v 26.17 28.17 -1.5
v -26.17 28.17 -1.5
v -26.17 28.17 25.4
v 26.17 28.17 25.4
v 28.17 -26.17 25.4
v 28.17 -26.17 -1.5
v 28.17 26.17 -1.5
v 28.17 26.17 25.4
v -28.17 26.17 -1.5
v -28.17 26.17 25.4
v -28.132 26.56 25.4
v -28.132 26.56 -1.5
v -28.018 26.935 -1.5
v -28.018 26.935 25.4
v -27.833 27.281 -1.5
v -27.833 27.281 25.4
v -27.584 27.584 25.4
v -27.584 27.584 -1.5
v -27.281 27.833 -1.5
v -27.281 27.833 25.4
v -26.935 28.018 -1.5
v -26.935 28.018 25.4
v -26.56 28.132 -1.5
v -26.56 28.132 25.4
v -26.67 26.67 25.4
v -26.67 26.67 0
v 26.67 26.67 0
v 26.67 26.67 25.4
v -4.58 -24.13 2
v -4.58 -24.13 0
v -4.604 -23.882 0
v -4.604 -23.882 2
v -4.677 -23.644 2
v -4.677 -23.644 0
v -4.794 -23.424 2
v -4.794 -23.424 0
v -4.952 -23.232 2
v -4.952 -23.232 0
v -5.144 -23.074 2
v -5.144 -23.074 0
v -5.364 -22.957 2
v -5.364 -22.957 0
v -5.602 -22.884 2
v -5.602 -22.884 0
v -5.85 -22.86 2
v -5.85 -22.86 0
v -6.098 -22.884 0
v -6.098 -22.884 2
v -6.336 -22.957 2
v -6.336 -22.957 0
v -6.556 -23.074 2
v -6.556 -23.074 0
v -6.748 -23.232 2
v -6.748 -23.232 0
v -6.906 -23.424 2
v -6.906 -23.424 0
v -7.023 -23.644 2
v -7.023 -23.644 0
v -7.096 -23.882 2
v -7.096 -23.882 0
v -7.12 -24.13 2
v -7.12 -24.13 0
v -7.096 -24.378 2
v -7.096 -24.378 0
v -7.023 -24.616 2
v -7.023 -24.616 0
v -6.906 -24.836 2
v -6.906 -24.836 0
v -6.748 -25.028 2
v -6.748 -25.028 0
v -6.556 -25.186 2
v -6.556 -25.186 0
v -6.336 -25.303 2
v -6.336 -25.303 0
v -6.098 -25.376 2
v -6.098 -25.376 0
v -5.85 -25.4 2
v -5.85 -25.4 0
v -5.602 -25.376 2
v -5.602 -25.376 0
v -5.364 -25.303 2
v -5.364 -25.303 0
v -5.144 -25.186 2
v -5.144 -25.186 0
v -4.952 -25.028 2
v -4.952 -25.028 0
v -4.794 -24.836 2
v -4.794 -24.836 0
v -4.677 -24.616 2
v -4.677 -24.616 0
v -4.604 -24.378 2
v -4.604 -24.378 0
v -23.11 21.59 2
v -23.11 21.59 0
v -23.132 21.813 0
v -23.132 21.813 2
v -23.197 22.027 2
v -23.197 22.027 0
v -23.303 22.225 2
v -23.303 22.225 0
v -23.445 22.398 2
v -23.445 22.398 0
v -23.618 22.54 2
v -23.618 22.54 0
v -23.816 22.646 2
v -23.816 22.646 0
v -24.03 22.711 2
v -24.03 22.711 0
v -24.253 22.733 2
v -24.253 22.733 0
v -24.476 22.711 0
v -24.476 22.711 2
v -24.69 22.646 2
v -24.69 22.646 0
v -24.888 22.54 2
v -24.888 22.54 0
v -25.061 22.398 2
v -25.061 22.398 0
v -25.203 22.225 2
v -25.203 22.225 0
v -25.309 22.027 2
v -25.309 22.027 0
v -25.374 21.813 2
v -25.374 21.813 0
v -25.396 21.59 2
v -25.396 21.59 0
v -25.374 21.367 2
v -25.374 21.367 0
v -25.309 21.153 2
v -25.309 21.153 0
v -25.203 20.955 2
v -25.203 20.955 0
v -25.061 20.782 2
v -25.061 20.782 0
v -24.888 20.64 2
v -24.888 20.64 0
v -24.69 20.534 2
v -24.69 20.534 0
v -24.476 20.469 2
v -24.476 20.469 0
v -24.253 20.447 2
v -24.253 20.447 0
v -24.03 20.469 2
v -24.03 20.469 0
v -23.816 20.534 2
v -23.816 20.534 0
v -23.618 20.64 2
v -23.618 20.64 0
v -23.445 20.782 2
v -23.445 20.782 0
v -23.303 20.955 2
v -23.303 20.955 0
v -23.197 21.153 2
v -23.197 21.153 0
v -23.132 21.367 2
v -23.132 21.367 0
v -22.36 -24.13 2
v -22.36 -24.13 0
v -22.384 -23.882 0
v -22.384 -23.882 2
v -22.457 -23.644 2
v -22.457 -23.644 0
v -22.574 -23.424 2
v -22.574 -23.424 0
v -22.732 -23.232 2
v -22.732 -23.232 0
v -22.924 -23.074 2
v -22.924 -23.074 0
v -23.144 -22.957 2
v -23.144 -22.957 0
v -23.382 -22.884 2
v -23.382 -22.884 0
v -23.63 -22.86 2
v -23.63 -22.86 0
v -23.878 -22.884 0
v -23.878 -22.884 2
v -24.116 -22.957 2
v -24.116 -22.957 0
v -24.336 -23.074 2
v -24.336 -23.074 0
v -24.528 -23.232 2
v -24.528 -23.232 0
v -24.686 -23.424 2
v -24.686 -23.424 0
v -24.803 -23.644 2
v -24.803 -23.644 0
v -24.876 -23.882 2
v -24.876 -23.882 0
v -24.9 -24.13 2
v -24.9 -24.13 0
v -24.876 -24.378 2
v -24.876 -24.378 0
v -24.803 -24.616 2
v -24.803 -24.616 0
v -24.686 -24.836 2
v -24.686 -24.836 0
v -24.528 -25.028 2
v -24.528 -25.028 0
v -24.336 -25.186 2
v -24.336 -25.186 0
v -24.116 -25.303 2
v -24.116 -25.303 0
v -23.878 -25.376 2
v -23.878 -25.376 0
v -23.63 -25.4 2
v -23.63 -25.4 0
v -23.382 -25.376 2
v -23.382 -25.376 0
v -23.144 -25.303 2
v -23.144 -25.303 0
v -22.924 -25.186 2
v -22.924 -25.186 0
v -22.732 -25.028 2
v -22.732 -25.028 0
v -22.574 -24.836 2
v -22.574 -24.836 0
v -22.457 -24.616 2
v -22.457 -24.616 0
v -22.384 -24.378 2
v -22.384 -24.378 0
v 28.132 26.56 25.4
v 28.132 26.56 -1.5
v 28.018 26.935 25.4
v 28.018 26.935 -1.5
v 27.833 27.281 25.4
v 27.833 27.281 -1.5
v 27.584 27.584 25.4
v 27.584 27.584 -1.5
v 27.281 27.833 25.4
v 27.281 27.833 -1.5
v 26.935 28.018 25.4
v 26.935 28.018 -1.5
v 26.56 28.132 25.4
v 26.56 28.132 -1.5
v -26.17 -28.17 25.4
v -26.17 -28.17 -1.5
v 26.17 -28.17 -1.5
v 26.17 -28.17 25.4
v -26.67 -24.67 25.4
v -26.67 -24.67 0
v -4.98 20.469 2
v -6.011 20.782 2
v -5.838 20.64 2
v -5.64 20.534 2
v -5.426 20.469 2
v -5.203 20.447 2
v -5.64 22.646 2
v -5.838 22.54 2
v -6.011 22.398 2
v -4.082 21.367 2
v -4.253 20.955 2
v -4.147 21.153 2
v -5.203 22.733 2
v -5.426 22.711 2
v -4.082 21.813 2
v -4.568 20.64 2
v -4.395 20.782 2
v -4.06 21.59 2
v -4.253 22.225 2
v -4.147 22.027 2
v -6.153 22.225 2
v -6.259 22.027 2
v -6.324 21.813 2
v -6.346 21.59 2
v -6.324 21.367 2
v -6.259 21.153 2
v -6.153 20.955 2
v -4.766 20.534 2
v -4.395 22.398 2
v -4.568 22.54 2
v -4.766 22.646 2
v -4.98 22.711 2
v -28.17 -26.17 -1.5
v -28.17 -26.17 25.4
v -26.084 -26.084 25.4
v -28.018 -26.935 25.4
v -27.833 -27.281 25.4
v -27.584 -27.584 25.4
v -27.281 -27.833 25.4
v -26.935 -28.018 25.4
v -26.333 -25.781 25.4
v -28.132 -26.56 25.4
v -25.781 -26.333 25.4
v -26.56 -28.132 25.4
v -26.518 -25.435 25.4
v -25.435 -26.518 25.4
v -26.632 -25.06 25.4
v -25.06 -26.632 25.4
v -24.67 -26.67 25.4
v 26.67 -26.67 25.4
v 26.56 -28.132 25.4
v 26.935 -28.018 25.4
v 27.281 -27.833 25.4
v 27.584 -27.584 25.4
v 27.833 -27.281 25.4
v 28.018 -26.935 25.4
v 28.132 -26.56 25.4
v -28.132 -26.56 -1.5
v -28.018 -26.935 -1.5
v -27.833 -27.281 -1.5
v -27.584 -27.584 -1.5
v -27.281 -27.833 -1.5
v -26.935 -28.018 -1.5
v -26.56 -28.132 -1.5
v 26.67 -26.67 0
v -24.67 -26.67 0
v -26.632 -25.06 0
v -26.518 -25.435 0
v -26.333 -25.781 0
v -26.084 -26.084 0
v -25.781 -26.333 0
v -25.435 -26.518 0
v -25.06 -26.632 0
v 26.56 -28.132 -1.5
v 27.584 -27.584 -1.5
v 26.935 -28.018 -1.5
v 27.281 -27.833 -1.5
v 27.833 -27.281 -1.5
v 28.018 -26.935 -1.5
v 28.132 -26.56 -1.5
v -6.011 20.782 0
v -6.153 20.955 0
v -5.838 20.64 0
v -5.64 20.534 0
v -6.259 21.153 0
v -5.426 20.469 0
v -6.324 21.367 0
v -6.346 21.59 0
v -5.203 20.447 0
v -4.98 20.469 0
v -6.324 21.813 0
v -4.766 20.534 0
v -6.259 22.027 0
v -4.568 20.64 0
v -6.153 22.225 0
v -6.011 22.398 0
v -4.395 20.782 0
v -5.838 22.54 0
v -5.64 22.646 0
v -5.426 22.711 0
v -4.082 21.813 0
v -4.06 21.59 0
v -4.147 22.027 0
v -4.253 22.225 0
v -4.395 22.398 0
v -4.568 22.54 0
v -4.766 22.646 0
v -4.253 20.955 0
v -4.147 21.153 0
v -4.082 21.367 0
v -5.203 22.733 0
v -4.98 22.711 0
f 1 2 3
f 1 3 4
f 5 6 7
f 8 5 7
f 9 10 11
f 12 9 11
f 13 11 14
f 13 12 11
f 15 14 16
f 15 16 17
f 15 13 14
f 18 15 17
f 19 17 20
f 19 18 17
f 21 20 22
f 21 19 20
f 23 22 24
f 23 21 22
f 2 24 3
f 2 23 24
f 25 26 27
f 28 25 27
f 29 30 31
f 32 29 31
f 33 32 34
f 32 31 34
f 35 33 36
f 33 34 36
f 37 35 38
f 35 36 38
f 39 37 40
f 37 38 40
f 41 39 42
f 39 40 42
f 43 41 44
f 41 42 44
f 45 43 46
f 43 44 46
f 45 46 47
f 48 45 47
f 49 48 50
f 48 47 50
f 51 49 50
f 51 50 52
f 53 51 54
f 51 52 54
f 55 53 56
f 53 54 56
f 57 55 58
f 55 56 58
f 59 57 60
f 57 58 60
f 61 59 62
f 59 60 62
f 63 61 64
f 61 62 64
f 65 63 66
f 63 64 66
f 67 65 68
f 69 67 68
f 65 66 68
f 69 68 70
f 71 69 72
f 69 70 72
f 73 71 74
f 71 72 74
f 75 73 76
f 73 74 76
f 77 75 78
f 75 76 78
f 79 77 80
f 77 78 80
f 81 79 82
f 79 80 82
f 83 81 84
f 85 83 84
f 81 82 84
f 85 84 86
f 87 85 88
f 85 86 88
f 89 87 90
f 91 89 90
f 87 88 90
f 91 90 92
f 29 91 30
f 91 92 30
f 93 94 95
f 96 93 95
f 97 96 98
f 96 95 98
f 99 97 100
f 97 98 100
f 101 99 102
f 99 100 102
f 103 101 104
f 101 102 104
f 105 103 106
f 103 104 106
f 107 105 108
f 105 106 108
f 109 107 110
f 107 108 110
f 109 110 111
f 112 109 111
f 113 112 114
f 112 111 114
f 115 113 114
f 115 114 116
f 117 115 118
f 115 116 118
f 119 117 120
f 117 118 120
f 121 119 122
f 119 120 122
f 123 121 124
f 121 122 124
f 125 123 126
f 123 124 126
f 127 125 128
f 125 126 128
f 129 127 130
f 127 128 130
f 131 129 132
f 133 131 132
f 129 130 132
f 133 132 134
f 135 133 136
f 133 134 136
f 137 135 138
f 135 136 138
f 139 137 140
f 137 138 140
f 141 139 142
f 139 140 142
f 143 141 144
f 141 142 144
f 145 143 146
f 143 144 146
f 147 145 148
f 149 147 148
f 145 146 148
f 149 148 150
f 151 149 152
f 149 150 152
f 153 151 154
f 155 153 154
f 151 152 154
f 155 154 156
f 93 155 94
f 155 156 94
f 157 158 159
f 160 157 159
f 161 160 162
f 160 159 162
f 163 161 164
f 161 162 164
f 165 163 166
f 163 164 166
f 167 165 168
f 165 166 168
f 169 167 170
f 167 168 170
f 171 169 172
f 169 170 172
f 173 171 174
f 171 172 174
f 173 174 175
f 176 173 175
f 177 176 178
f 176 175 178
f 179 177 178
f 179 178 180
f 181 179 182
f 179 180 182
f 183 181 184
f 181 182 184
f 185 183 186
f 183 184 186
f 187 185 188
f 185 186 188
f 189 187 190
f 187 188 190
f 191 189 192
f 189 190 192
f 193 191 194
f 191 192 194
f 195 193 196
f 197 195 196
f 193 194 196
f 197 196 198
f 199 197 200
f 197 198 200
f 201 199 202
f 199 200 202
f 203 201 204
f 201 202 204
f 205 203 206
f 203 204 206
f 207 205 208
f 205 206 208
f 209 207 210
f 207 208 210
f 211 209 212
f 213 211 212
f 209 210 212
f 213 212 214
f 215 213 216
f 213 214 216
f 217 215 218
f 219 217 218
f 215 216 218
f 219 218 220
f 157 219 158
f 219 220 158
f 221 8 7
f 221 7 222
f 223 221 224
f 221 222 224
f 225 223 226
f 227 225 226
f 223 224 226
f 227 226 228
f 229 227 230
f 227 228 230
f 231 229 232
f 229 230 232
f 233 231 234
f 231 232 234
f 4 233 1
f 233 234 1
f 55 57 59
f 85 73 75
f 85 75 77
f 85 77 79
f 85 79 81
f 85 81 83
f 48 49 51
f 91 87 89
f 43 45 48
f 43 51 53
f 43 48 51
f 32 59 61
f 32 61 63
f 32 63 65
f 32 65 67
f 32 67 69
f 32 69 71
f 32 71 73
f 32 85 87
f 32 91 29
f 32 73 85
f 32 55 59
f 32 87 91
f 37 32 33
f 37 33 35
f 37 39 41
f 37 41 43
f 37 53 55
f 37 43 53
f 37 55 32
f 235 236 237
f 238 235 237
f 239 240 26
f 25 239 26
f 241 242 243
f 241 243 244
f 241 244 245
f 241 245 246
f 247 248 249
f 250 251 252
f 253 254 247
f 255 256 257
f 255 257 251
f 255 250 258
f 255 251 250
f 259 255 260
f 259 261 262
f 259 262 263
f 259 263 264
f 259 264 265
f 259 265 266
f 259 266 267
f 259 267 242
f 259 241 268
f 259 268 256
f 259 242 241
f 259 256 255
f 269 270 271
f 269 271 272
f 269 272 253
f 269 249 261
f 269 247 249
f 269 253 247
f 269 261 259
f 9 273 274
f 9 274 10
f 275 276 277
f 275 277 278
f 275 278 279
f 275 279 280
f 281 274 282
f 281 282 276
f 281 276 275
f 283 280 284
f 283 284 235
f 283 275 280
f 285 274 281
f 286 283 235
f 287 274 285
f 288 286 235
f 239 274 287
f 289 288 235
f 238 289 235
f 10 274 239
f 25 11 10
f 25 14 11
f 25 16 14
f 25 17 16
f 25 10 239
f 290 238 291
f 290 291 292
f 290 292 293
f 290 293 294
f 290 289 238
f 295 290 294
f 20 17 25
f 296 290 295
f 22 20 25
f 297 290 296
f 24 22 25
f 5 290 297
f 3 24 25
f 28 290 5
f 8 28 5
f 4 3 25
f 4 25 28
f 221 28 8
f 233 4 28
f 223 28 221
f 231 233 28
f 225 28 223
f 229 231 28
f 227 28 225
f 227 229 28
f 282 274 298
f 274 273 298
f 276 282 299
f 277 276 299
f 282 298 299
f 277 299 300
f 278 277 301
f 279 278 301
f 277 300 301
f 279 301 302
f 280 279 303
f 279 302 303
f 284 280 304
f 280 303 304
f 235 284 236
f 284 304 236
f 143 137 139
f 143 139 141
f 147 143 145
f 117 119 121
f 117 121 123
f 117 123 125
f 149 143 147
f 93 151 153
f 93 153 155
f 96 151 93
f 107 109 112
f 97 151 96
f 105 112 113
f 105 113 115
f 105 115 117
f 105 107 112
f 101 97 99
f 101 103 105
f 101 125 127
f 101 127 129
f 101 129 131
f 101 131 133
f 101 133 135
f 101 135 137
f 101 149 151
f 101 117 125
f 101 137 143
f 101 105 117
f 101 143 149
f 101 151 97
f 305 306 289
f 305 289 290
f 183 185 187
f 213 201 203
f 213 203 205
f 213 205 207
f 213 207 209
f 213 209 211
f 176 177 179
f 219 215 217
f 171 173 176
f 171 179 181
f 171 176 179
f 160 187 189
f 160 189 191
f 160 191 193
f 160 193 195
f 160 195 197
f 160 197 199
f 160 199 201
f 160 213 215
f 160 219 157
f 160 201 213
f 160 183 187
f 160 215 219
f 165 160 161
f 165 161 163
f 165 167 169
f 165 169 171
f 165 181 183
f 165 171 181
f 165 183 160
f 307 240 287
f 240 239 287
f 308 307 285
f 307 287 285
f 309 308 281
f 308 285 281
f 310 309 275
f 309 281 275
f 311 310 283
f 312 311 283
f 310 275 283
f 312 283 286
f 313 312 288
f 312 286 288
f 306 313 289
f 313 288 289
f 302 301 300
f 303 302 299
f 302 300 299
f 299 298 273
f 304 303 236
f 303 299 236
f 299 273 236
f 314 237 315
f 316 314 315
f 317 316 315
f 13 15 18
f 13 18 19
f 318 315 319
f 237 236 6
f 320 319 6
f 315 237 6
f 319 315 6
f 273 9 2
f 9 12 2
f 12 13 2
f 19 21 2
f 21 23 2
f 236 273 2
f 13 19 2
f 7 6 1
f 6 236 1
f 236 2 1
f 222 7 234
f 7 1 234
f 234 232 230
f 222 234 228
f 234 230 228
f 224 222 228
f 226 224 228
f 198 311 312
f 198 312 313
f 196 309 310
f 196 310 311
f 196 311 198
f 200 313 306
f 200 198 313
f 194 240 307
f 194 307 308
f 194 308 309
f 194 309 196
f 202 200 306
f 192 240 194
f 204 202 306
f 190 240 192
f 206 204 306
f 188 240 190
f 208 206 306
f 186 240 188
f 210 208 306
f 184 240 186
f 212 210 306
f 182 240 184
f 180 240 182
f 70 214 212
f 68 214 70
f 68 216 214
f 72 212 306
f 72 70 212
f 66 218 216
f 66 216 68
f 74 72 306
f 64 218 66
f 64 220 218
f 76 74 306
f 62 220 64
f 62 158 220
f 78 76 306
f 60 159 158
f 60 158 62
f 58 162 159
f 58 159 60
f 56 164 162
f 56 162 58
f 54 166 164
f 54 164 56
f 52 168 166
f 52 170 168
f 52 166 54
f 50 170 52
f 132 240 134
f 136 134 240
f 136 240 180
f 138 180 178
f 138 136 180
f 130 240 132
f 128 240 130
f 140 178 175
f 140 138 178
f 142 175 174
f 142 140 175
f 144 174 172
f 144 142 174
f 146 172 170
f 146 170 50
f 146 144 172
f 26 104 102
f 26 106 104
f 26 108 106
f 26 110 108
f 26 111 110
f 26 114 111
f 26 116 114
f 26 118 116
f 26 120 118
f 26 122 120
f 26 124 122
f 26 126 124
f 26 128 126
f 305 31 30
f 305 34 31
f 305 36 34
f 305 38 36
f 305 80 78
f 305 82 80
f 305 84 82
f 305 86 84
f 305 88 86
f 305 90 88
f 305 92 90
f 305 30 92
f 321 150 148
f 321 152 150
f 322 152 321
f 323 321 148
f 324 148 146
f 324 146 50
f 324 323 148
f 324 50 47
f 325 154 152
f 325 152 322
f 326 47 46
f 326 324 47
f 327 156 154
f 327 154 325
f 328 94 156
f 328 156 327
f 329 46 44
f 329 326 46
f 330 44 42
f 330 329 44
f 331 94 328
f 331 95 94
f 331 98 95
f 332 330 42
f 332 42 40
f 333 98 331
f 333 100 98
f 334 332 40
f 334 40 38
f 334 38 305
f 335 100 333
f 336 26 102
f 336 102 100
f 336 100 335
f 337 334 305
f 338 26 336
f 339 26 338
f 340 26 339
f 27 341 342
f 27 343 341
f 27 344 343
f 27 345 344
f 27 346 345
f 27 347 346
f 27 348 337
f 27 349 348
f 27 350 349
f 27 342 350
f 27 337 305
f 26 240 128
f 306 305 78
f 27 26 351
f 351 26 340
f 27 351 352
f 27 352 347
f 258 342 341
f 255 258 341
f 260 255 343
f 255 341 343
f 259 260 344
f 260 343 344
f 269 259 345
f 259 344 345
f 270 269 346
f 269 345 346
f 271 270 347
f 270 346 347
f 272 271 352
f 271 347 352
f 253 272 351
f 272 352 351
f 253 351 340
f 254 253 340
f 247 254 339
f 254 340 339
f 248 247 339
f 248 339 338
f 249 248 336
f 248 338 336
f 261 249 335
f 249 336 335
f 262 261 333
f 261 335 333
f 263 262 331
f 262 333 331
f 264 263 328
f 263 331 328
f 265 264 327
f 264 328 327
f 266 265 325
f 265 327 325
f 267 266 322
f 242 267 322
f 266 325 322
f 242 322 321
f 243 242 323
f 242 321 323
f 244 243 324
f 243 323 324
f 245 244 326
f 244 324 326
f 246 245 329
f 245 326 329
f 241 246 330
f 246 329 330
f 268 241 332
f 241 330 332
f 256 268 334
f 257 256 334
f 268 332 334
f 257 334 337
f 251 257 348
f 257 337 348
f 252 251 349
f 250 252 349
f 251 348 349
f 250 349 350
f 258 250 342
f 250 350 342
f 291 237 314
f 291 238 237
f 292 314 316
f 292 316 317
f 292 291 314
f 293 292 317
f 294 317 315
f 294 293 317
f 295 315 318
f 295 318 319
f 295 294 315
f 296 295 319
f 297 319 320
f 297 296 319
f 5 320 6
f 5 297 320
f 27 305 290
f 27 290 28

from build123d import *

# Parameters (mm, degrees)
F0_W     = 53.34
F0_H     = 53.34
F1_DEPTH = 25.4
F2_T     = 1.5
F3_R     = 1.27
F3_R_2   = 1.143
F4_DEPTH = 2
F5_R     = 2


# Not quite as in the source:
# - two fillets or chamfers of one size are made in one step


with BuildPart() as f1:
    # F0 (on Top) → F1 (new body)
    with BuildSketch(Plane.XY):
        Rectangle(F0_W, F0_H)
    extrude(amount=F1_DEPTH)

    # F2
    f2_openings = [f1.faces().sort_by_distance(p)[0] for p in [
        (0, 0, 25.4),
    ]]
    offset(amount=F2_T, openings=f2_openings, kind=Kind.INTERSECTION)

    # F3 (on face) → F4 (join)
    with BuildSketch(Plane.XY):
        with Locations((-23.63, -24.13)):
            Circle(F3_R)
        with Locations((-5.85, -24.13)):
            Circle(F3_R)
        with Locations((-24.253, 21.59)):
            Circle(F3_R_2)
        with Locations((-5.203, 21.59)):
            Circle(F3_R_2)
    extrude(amount=F4_DEPTH)

    # F5
    f5_edges = [f1.edges().sort_by_distance(p)[0] for p in [
        (-26.67, -26.67, 12.7),
        (28.17, -28.17, 11.95),
        (-28.17, -28.17, 11.95),
        (28.17, 28.17, 11.95),
        (-28.17, 28.17, 11.95),
    ]]
    fillet(f5_edges, radius=F5_R)


solid = f1.part
